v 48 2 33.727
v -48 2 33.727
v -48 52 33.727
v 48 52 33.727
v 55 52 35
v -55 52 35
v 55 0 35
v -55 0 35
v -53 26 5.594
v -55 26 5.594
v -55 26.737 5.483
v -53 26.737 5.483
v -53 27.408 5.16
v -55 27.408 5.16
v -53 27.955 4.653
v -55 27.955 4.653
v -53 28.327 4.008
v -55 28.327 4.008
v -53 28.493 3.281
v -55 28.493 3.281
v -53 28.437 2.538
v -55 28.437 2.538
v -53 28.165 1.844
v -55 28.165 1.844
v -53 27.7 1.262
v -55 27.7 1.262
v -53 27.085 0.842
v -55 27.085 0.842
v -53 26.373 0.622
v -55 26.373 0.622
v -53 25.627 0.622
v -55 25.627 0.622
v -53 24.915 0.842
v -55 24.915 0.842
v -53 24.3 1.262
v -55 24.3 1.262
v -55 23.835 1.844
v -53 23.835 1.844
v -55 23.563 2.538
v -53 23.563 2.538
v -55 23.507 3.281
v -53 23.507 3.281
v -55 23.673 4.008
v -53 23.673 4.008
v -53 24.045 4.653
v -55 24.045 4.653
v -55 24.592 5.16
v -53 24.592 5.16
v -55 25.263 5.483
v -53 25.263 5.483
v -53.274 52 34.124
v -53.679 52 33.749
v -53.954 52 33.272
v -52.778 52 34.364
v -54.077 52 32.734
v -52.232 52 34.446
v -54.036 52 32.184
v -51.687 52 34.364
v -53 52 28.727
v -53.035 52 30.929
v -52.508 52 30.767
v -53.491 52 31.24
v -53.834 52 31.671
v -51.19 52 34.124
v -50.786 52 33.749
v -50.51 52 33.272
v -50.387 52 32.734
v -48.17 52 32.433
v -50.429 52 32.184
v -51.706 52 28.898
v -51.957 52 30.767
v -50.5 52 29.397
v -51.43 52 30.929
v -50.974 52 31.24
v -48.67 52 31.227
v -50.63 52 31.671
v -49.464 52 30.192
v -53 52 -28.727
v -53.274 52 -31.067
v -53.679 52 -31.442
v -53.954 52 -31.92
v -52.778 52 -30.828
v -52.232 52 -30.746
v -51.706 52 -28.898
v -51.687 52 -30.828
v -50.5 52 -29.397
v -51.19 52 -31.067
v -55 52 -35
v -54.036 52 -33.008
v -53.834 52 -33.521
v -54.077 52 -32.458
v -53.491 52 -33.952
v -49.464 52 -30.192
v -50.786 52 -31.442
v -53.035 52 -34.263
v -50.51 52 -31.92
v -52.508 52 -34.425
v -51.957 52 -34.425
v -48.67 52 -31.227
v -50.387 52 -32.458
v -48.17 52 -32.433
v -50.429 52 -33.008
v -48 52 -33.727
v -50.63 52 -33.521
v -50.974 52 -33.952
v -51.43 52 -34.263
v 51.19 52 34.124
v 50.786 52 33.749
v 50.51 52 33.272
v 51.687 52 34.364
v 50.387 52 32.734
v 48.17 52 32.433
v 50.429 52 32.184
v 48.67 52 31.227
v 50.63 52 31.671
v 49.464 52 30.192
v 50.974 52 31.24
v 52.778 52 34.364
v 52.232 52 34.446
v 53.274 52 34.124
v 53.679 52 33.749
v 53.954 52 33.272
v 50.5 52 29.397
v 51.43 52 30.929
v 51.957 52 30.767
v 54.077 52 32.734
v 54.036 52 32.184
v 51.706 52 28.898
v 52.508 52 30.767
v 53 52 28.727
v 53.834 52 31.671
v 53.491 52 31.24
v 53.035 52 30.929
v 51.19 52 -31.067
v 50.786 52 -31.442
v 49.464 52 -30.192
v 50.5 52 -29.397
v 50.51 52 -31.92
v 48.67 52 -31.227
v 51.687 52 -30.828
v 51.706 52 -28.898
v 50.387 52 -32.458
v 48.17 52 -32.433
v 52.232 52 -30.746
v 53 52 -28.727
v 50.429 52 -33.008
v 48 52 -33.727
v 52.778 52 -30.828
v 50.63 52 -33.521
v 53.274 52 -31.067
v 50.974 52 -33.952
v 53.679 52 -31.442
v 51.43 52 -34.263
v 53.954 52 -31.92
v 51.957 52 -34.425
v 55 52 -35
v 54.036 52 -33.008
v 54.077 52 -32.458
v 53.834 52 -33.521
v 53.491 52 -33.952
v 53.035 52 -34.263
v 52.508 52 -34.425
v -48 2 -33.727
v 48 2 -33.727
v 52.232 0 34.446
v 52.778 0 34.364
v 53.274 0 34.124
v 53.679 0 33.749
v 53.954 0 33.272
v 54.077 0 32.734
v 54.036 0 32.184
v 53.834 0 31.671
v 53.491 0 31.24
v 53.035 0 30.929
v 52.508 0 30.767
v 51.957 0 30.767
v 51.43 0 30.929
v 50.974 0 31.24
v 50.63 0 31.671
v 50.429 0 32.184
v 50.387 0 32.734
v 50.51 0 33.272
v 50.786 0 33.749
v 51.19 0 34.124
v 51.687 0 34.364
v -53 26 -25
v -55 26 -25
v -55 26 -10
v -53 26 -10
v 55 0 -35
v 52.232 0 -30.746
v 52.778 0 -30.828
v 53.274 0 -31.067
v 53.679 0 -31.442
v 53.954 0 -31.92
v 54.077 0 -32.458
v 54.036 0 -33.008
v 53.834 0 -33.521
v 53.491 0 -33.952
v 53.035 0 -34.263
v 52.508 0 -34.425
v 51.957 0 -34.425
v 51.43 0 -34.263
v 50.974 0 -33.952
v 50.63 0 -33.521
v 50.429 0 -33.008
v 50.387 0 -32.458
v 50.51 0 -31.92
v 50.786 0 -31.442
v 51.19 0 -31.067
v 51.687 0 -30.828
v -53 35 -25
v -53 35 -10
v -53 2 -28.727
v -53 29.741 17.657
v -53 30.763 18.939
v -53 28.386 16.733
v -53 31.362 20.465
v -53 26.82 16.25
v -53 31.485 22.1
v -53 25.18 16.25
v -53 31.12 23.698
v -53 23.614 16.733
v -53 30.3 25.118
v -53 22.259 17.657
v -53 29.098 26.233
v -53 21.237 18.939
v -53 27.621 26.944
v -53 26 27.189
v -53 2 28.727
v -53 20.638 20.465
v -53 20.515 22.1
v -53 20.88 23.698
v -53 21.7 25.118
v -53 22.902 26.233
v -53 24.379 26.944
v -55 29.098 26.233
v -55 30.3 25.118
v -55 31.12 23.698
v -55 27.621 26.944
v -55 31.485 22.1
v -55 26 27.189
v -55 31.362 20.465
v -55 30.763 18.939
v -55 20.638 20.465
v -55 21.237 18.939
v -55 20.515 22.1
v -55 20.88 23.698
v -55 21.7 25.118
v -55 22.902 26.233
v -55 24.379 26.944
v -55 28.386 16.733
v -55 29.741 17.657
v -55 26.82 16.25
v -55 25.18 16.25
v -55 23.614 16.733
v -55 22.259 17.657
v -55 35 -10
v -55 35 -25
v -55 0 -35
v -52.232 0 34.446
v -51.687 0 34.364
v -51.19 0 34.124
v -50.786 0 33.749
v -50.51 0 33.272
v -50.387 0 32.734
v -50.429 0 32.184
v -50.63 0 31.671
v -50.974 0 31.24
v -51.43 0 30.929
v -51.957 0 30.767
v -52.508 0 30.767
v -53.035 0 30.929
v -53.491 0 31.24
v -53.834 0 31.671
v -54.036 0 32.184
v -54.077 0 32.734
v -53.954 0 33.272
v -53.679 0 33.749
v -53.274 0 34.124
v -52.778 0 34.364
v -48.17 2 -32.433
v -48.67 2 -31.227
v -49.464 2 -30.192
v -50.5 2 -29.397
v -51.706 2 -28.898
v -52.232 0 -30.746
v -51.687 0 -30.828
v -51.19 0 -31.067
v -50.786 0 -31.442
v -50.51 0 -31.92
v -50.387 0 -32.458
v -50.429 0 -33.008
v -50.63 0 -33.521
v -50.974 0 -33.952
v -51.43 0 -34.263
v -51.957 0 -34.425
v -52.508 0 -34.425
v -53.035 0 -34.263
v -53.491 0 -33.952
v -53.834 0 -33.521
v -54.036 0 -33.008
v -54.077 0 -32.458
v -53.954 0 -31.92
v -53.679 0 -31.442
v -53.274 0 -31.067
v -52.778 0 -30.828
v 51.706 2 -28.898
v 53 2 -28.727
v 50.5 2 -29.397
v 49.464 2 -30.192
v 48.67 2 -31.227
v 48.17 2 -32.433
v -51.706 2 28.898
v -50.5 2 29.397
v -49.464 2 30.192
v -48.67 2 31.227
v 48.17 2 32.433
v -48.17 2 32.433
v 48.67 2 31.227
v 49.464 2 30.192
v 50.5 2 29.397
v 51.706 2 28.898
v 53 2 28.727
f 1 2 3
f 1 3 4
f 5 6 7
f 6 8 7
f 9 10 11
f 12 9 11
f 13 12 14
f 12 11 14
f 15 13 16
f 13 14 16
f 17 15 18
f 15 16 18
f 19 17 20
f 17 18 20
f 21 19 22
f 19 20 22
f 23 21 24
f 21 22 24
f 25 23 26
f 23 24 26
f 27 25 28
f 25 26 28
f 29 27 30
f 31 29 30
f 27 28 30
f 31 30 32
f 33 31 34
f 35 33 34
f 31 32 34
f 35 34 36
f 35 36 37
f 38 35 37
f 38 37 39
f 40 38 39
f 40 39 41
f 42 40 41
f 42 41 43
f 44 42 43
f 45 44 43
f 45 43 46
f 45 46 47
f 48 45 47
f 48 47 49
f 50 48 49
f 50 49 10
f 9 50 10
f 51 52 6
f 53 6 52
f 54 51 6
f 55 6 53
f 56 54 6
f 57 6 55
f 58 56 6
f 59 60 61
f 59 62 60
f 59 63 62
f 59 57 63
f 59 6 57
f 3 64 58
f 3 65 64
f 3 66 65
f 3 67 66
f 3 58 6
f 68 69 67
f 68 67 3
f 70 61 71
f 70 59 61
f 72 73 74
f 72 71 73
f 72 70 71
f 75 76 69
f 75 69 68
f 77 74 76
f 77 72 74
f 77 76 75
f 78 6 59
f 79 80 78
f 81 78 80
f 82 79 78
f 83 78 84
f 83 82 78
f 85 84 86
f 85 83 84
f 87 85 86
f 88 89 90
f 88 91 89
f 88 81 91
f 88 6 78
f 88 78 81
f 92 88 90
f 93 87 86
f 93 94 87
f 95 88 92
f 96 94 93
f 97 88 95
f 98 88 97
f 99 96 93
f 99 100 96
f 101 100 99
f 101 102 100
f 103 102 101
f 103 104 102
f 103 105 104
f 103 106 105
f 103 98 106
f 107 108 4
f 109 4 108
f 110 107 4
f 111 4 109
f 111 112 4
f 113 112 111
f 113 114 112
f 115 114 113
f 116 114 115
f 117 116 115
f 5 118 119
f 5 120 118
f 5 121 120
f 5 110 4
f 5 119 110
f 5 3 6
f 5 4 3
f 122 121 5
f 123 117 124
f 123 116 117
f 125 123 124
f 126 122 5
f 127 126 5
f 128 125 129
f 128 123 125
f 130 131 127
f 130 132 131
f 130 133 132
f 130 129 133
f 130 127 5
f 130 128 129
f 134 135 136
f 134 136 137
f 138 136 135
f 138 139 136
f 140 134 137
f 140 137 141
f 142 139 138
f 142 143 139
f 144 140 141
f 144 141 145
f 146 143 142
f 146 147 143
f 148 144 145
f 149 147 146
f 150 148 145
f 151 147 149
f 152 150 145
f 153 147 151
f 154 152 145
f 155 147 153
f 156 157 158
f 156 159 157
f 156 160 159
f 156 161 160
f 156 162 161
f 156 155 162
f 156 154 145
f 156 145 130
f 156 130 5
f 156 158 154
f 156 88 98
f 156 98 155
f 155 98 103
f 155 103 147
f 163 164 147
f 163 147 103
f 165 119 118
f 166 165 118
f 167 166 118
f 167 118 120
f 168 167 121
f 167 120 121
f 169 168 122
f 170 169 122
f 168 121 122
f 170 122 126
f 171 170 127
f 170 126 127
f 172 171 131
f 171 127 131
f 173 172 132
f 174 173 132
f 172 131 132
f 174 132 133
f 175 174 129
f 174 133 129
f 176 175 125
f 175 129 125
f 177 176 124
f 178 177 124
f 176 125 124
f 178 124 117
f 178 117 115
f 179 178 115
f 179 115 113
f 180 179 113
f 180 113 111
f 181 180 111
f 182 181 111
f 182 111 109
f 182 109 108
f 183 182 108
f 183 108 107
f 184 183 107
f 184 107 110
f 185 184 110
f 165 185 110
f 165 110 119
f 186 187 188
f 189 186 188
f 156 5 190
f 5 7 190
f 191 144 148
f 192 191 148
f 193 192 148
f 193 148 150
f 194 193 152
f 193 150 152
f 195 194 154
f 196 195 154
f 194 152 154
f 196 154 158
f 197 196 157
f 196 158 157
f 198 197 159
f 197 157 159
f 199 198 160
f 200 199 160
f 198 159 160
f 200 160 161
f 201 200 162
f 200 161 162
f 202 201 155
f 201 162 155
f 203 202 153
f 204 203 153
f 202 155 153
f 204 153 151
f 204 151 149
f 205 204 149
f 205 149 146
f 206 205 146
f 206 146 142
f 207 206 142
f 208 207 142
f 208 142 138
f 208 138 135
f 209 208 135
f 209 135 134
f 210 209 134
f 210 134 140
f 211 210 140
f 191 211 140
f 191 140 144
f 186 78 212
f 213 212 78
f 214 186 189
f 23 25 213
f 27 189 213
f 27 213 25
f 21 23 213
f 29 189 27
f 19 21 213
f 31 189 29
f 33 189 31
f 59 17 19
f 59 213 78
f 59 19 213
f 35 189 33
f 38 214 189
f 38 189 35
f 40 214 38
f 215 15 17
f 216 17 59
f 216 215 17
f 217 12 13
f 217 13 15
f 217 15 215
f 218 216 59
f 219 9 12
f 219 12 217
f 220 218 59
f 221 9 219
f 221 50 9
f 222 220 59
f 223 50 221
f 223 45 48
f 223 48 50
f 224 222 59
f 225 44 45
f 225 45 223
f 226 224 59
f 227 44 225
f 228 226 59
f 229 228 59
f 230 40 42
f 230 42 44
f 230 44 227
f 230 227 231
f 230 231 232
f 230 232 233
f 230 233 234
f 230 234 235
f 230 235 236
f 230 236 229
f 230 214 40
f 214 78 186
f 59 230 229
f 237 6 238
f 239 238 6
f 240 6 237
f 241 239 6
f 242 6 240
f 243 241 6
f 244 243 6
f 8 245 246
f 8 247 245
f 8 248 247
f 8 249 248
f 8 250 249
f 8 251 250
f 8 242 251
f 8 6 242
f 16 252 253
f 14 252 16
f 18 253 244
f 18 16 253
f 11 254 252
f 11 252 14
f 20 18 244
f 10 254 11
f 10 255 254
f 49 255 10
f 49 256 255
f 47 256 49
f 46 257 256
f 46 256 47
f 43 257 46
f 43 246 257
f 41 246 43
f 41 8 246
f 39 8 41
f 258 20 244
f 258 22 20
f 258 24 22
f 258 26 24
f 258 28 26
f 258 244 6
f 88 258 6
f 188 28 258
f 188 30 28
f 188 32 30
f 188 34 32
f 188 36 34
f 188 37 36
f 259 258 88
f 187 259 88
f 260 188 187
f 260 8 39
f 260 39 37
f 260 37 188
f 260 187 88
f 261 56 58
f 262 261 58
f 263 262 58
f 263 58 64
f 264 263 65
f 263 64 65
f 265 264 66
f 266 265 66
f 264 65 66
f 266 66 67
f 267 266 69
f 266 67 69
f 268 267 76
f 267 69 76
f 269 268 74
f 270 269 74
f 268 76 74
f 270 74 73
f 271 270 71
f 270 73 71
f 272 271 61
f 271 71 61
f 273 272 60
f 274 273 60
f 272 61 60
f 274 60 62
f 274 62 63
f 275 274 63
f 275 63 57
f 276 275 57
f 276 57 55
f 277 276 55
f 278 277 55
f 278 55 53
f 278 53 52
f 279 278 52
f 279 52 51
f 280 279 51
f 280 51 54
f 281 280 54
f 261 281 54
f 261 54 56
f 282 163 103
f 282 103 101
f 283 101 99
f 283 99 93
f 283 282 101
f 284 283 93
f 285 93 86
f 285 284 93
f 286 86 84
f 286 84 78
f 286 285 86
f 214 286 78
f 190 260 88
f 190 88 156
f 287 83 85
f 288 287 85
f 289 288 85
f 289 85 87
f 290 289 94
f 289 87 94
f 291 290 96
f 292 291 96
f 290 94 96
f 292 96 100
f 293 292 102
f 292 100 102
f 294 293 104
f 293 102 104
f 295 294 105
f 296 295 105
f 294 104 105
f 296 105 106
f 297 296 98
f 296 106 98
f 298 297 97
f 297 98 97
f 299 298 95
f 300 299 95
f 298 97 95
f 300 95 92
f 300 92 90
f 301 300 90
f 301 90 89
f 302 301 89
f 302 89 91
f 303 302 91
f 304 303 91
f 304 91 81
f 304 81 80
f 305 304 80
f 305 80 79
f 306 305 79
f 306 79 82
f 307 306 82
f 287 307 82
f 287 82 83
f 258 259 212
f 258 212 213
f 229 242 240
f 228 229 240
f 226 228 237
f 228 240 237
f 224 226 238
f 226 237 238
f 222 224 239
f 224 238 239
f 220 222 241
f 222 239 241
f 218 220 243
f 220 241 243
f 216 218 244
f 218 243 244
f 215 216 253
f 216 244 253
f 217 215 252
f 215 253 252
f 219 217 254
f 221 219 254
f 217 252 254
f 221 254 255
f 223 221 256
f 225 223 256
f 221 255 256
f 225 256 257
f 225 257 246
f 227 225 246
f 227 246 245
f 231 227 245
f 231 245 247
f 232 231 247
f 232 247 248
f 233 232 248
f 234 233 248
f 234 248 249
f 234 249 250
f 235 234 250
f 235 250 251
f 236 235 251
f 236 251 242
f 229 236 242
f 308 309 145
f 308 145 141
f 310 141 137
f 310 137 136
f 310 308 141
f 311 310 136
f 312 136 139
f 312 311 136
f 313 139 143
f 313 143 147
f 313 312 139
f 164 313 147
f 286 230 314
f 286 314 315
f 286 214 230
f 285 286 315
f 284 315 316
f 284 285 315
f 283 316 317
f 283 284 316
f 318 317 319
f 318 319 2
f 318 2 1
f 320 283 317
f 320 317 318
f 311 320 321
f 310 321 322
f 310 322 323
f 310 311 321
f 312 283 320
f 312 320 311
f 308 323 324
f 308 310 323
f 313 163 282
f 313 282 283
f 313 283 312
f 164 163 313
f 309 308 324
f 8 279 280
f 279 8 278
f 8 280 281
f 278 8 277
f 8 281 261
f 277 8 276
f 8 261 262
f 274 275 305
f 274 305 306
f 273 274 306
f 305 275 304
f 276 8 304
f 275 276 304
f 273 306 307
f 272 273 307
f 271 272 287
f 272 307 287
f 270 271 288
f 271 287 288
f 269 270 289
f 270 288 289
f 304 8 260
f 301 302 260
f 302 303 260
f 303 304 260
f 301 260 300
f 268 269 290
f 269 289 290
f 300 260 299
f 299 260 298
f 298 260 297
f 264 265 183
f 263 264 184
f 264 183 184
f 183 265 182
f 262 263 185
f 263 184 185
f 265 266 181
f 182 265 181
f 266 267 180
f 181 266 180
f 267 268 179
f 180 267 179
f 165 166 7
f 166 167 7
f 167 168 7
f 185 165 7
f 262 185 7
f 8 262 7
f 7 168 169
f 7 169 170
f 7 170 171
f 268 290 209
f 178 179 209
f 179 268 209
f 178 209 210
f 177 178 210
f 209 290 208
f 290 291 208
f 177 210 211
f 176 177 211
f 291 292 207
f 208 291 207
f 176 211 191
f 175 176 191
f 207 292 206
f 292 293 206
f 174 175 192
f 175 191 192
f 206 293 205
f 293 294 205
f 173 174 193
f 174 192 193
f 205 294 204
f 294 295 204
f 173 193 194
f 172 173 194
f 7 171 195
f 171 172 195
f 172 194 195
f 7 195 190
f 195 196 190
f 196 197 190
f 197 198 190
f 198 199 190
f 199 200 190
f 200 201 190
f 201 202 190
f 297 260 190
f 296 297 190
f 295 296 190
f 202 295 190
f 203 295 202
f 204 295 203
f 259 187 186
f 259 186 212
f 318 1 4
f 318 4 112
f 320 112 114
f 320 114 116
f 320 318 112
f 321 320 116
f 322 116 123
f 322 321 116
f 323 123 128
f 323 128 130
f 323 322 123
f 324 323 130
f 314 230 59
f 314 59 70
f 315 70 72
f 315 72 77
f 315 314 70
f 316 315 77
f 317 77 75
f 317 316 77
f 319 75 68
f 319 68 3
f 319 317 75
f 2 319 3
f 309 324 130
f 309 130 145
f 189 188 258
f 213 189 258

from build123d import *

# Parameters (mm, degrees)
IZIM1_W                     = 110
IZIM1_H                     = 70
Y_KSEKLIK_EKSTR_ZYON1_DEPTH = 2
IZIM2_W                     = 110
IZIM2_H                     = 70
Y_KSEKLIK_EKSTR_ZYON2_DEPTH = 50
IZIM3_R                     = 5.5
KES_EKSTR_ZYON1_DEPTH       = 13
IZIM4_R                     = 2.5
IZIM4_W                     = 15
IZIM4_H                     = 9
KES_EKSTR_ZYON2_DEPTH       = 13
IZIM5_R                     = 1.85
KES_EKSTR_ZYON3_DEPTH       = 67


with BuildPart() as part:
    # Çizim1 → Yükseklik-Ekstrüzyon1 (new body)
    with BuildSketch(Plane(origin=(0, 0, 0), x_dir=(1, 0, 0), z_dir=(0, 1, 0))):
        Rectangle(IZIM1_W, IZIM1_H)
    extrude(amount=Y_KSEKLIK_EKSTR_ZYON1_DEPTH)

    # Çizim2 → Yükseklik-Ekstrüzyon2 (add)
    with BuildSketch(Plane(origin=(0, 2, 0), x_dir=(1, 0, 0), z_dir=(0, 1, 0))):
        Rectangle(IZIM2_W, IZIM2_H)
        with BuildLine():
            Line((-48, -33.727272727), (48, -33.727272727))
            ThreePointArc((48, -33.727272727), (49.464466094, -30.191738821), (53, -28.727272727))
            Line((53, -28.727272727), (53, 28.727272727))
            ThreePointArc((53, 28.727272727), (49.464466094, 30.191738821), (48, 33.727272727))
            Line((48, 33.727272727), (-48, 33.727272727))
            ThreePointArc((-48, 33.727272727), (-49.464466094, 30.191738821), (-53, 28.727272727))
            Line((-53, 28.727272727), (-53, -28.727272727))
            ThreePointArc((-53, -28.727272727), (-49.464466094, -30.191738821), (-48, -33.727272727))
        make_face(mode=Mode.SUBTRACT)
    extrude(amount=Y_KSEKLIK_EKSTR_ZYON2_DEPTH)

    # Çizim3 → Kes-Ekstrüzyon1 (cut)
    with BuildSketch(Plane.ZY.offset(55)):
        with Locations((21.688585695, 26)):
            Circle(IZIM3_R)
    extrude(amount=-KES_EKSTR_ZYON1_DEPTH, mode=Mode.SUBTRACT)

    # Çizim4 → Kes-Ekstrüzyon2 (cut)
    with BuildSketch(Plane.ZY.offset(55)):
        with Locations((3.094292848, 26)):
            Circle(IZIM4_R)
        with Locations((-17.5, 30.5)):
            Rectangle(IZIM4_W, IZIM4_H)
    extrude(amount=-KES_EKSTR_ZYON2_DEPTH, mode=Mode.SUBTRACT)

    # Çizim5 → Kes-Ekstrüzyon3 (cut)
    with BuildSketch(Plane(origin=(0, 52, 0), x_dir=(1, 0, 0), z_dir=(0, 1, 0))):
        with Locations(Location((-52.232233047, 32.595869411, 0), (0, 0, 270))):
            Circle(IZIM5_R)
        with Locations(Location((52.232233047, 32.595869411, 0), (0, 0, 270))):
            Circle(IZIM5_R)
        with Locations(Location((52.232233047, -32.595869411, 0), (0, 0, 270))):
            Circle(IZIM5_R)
        with Locations(Location((-52.232233047, -32.595869411, 0), (0, 0, 270))):
            Circle(IZIM5_R)
    extrude(amount=-KES_EKSTR_ZYON3_DEPTH, mode=Mode.SUBTRACT)


solid = part.part
